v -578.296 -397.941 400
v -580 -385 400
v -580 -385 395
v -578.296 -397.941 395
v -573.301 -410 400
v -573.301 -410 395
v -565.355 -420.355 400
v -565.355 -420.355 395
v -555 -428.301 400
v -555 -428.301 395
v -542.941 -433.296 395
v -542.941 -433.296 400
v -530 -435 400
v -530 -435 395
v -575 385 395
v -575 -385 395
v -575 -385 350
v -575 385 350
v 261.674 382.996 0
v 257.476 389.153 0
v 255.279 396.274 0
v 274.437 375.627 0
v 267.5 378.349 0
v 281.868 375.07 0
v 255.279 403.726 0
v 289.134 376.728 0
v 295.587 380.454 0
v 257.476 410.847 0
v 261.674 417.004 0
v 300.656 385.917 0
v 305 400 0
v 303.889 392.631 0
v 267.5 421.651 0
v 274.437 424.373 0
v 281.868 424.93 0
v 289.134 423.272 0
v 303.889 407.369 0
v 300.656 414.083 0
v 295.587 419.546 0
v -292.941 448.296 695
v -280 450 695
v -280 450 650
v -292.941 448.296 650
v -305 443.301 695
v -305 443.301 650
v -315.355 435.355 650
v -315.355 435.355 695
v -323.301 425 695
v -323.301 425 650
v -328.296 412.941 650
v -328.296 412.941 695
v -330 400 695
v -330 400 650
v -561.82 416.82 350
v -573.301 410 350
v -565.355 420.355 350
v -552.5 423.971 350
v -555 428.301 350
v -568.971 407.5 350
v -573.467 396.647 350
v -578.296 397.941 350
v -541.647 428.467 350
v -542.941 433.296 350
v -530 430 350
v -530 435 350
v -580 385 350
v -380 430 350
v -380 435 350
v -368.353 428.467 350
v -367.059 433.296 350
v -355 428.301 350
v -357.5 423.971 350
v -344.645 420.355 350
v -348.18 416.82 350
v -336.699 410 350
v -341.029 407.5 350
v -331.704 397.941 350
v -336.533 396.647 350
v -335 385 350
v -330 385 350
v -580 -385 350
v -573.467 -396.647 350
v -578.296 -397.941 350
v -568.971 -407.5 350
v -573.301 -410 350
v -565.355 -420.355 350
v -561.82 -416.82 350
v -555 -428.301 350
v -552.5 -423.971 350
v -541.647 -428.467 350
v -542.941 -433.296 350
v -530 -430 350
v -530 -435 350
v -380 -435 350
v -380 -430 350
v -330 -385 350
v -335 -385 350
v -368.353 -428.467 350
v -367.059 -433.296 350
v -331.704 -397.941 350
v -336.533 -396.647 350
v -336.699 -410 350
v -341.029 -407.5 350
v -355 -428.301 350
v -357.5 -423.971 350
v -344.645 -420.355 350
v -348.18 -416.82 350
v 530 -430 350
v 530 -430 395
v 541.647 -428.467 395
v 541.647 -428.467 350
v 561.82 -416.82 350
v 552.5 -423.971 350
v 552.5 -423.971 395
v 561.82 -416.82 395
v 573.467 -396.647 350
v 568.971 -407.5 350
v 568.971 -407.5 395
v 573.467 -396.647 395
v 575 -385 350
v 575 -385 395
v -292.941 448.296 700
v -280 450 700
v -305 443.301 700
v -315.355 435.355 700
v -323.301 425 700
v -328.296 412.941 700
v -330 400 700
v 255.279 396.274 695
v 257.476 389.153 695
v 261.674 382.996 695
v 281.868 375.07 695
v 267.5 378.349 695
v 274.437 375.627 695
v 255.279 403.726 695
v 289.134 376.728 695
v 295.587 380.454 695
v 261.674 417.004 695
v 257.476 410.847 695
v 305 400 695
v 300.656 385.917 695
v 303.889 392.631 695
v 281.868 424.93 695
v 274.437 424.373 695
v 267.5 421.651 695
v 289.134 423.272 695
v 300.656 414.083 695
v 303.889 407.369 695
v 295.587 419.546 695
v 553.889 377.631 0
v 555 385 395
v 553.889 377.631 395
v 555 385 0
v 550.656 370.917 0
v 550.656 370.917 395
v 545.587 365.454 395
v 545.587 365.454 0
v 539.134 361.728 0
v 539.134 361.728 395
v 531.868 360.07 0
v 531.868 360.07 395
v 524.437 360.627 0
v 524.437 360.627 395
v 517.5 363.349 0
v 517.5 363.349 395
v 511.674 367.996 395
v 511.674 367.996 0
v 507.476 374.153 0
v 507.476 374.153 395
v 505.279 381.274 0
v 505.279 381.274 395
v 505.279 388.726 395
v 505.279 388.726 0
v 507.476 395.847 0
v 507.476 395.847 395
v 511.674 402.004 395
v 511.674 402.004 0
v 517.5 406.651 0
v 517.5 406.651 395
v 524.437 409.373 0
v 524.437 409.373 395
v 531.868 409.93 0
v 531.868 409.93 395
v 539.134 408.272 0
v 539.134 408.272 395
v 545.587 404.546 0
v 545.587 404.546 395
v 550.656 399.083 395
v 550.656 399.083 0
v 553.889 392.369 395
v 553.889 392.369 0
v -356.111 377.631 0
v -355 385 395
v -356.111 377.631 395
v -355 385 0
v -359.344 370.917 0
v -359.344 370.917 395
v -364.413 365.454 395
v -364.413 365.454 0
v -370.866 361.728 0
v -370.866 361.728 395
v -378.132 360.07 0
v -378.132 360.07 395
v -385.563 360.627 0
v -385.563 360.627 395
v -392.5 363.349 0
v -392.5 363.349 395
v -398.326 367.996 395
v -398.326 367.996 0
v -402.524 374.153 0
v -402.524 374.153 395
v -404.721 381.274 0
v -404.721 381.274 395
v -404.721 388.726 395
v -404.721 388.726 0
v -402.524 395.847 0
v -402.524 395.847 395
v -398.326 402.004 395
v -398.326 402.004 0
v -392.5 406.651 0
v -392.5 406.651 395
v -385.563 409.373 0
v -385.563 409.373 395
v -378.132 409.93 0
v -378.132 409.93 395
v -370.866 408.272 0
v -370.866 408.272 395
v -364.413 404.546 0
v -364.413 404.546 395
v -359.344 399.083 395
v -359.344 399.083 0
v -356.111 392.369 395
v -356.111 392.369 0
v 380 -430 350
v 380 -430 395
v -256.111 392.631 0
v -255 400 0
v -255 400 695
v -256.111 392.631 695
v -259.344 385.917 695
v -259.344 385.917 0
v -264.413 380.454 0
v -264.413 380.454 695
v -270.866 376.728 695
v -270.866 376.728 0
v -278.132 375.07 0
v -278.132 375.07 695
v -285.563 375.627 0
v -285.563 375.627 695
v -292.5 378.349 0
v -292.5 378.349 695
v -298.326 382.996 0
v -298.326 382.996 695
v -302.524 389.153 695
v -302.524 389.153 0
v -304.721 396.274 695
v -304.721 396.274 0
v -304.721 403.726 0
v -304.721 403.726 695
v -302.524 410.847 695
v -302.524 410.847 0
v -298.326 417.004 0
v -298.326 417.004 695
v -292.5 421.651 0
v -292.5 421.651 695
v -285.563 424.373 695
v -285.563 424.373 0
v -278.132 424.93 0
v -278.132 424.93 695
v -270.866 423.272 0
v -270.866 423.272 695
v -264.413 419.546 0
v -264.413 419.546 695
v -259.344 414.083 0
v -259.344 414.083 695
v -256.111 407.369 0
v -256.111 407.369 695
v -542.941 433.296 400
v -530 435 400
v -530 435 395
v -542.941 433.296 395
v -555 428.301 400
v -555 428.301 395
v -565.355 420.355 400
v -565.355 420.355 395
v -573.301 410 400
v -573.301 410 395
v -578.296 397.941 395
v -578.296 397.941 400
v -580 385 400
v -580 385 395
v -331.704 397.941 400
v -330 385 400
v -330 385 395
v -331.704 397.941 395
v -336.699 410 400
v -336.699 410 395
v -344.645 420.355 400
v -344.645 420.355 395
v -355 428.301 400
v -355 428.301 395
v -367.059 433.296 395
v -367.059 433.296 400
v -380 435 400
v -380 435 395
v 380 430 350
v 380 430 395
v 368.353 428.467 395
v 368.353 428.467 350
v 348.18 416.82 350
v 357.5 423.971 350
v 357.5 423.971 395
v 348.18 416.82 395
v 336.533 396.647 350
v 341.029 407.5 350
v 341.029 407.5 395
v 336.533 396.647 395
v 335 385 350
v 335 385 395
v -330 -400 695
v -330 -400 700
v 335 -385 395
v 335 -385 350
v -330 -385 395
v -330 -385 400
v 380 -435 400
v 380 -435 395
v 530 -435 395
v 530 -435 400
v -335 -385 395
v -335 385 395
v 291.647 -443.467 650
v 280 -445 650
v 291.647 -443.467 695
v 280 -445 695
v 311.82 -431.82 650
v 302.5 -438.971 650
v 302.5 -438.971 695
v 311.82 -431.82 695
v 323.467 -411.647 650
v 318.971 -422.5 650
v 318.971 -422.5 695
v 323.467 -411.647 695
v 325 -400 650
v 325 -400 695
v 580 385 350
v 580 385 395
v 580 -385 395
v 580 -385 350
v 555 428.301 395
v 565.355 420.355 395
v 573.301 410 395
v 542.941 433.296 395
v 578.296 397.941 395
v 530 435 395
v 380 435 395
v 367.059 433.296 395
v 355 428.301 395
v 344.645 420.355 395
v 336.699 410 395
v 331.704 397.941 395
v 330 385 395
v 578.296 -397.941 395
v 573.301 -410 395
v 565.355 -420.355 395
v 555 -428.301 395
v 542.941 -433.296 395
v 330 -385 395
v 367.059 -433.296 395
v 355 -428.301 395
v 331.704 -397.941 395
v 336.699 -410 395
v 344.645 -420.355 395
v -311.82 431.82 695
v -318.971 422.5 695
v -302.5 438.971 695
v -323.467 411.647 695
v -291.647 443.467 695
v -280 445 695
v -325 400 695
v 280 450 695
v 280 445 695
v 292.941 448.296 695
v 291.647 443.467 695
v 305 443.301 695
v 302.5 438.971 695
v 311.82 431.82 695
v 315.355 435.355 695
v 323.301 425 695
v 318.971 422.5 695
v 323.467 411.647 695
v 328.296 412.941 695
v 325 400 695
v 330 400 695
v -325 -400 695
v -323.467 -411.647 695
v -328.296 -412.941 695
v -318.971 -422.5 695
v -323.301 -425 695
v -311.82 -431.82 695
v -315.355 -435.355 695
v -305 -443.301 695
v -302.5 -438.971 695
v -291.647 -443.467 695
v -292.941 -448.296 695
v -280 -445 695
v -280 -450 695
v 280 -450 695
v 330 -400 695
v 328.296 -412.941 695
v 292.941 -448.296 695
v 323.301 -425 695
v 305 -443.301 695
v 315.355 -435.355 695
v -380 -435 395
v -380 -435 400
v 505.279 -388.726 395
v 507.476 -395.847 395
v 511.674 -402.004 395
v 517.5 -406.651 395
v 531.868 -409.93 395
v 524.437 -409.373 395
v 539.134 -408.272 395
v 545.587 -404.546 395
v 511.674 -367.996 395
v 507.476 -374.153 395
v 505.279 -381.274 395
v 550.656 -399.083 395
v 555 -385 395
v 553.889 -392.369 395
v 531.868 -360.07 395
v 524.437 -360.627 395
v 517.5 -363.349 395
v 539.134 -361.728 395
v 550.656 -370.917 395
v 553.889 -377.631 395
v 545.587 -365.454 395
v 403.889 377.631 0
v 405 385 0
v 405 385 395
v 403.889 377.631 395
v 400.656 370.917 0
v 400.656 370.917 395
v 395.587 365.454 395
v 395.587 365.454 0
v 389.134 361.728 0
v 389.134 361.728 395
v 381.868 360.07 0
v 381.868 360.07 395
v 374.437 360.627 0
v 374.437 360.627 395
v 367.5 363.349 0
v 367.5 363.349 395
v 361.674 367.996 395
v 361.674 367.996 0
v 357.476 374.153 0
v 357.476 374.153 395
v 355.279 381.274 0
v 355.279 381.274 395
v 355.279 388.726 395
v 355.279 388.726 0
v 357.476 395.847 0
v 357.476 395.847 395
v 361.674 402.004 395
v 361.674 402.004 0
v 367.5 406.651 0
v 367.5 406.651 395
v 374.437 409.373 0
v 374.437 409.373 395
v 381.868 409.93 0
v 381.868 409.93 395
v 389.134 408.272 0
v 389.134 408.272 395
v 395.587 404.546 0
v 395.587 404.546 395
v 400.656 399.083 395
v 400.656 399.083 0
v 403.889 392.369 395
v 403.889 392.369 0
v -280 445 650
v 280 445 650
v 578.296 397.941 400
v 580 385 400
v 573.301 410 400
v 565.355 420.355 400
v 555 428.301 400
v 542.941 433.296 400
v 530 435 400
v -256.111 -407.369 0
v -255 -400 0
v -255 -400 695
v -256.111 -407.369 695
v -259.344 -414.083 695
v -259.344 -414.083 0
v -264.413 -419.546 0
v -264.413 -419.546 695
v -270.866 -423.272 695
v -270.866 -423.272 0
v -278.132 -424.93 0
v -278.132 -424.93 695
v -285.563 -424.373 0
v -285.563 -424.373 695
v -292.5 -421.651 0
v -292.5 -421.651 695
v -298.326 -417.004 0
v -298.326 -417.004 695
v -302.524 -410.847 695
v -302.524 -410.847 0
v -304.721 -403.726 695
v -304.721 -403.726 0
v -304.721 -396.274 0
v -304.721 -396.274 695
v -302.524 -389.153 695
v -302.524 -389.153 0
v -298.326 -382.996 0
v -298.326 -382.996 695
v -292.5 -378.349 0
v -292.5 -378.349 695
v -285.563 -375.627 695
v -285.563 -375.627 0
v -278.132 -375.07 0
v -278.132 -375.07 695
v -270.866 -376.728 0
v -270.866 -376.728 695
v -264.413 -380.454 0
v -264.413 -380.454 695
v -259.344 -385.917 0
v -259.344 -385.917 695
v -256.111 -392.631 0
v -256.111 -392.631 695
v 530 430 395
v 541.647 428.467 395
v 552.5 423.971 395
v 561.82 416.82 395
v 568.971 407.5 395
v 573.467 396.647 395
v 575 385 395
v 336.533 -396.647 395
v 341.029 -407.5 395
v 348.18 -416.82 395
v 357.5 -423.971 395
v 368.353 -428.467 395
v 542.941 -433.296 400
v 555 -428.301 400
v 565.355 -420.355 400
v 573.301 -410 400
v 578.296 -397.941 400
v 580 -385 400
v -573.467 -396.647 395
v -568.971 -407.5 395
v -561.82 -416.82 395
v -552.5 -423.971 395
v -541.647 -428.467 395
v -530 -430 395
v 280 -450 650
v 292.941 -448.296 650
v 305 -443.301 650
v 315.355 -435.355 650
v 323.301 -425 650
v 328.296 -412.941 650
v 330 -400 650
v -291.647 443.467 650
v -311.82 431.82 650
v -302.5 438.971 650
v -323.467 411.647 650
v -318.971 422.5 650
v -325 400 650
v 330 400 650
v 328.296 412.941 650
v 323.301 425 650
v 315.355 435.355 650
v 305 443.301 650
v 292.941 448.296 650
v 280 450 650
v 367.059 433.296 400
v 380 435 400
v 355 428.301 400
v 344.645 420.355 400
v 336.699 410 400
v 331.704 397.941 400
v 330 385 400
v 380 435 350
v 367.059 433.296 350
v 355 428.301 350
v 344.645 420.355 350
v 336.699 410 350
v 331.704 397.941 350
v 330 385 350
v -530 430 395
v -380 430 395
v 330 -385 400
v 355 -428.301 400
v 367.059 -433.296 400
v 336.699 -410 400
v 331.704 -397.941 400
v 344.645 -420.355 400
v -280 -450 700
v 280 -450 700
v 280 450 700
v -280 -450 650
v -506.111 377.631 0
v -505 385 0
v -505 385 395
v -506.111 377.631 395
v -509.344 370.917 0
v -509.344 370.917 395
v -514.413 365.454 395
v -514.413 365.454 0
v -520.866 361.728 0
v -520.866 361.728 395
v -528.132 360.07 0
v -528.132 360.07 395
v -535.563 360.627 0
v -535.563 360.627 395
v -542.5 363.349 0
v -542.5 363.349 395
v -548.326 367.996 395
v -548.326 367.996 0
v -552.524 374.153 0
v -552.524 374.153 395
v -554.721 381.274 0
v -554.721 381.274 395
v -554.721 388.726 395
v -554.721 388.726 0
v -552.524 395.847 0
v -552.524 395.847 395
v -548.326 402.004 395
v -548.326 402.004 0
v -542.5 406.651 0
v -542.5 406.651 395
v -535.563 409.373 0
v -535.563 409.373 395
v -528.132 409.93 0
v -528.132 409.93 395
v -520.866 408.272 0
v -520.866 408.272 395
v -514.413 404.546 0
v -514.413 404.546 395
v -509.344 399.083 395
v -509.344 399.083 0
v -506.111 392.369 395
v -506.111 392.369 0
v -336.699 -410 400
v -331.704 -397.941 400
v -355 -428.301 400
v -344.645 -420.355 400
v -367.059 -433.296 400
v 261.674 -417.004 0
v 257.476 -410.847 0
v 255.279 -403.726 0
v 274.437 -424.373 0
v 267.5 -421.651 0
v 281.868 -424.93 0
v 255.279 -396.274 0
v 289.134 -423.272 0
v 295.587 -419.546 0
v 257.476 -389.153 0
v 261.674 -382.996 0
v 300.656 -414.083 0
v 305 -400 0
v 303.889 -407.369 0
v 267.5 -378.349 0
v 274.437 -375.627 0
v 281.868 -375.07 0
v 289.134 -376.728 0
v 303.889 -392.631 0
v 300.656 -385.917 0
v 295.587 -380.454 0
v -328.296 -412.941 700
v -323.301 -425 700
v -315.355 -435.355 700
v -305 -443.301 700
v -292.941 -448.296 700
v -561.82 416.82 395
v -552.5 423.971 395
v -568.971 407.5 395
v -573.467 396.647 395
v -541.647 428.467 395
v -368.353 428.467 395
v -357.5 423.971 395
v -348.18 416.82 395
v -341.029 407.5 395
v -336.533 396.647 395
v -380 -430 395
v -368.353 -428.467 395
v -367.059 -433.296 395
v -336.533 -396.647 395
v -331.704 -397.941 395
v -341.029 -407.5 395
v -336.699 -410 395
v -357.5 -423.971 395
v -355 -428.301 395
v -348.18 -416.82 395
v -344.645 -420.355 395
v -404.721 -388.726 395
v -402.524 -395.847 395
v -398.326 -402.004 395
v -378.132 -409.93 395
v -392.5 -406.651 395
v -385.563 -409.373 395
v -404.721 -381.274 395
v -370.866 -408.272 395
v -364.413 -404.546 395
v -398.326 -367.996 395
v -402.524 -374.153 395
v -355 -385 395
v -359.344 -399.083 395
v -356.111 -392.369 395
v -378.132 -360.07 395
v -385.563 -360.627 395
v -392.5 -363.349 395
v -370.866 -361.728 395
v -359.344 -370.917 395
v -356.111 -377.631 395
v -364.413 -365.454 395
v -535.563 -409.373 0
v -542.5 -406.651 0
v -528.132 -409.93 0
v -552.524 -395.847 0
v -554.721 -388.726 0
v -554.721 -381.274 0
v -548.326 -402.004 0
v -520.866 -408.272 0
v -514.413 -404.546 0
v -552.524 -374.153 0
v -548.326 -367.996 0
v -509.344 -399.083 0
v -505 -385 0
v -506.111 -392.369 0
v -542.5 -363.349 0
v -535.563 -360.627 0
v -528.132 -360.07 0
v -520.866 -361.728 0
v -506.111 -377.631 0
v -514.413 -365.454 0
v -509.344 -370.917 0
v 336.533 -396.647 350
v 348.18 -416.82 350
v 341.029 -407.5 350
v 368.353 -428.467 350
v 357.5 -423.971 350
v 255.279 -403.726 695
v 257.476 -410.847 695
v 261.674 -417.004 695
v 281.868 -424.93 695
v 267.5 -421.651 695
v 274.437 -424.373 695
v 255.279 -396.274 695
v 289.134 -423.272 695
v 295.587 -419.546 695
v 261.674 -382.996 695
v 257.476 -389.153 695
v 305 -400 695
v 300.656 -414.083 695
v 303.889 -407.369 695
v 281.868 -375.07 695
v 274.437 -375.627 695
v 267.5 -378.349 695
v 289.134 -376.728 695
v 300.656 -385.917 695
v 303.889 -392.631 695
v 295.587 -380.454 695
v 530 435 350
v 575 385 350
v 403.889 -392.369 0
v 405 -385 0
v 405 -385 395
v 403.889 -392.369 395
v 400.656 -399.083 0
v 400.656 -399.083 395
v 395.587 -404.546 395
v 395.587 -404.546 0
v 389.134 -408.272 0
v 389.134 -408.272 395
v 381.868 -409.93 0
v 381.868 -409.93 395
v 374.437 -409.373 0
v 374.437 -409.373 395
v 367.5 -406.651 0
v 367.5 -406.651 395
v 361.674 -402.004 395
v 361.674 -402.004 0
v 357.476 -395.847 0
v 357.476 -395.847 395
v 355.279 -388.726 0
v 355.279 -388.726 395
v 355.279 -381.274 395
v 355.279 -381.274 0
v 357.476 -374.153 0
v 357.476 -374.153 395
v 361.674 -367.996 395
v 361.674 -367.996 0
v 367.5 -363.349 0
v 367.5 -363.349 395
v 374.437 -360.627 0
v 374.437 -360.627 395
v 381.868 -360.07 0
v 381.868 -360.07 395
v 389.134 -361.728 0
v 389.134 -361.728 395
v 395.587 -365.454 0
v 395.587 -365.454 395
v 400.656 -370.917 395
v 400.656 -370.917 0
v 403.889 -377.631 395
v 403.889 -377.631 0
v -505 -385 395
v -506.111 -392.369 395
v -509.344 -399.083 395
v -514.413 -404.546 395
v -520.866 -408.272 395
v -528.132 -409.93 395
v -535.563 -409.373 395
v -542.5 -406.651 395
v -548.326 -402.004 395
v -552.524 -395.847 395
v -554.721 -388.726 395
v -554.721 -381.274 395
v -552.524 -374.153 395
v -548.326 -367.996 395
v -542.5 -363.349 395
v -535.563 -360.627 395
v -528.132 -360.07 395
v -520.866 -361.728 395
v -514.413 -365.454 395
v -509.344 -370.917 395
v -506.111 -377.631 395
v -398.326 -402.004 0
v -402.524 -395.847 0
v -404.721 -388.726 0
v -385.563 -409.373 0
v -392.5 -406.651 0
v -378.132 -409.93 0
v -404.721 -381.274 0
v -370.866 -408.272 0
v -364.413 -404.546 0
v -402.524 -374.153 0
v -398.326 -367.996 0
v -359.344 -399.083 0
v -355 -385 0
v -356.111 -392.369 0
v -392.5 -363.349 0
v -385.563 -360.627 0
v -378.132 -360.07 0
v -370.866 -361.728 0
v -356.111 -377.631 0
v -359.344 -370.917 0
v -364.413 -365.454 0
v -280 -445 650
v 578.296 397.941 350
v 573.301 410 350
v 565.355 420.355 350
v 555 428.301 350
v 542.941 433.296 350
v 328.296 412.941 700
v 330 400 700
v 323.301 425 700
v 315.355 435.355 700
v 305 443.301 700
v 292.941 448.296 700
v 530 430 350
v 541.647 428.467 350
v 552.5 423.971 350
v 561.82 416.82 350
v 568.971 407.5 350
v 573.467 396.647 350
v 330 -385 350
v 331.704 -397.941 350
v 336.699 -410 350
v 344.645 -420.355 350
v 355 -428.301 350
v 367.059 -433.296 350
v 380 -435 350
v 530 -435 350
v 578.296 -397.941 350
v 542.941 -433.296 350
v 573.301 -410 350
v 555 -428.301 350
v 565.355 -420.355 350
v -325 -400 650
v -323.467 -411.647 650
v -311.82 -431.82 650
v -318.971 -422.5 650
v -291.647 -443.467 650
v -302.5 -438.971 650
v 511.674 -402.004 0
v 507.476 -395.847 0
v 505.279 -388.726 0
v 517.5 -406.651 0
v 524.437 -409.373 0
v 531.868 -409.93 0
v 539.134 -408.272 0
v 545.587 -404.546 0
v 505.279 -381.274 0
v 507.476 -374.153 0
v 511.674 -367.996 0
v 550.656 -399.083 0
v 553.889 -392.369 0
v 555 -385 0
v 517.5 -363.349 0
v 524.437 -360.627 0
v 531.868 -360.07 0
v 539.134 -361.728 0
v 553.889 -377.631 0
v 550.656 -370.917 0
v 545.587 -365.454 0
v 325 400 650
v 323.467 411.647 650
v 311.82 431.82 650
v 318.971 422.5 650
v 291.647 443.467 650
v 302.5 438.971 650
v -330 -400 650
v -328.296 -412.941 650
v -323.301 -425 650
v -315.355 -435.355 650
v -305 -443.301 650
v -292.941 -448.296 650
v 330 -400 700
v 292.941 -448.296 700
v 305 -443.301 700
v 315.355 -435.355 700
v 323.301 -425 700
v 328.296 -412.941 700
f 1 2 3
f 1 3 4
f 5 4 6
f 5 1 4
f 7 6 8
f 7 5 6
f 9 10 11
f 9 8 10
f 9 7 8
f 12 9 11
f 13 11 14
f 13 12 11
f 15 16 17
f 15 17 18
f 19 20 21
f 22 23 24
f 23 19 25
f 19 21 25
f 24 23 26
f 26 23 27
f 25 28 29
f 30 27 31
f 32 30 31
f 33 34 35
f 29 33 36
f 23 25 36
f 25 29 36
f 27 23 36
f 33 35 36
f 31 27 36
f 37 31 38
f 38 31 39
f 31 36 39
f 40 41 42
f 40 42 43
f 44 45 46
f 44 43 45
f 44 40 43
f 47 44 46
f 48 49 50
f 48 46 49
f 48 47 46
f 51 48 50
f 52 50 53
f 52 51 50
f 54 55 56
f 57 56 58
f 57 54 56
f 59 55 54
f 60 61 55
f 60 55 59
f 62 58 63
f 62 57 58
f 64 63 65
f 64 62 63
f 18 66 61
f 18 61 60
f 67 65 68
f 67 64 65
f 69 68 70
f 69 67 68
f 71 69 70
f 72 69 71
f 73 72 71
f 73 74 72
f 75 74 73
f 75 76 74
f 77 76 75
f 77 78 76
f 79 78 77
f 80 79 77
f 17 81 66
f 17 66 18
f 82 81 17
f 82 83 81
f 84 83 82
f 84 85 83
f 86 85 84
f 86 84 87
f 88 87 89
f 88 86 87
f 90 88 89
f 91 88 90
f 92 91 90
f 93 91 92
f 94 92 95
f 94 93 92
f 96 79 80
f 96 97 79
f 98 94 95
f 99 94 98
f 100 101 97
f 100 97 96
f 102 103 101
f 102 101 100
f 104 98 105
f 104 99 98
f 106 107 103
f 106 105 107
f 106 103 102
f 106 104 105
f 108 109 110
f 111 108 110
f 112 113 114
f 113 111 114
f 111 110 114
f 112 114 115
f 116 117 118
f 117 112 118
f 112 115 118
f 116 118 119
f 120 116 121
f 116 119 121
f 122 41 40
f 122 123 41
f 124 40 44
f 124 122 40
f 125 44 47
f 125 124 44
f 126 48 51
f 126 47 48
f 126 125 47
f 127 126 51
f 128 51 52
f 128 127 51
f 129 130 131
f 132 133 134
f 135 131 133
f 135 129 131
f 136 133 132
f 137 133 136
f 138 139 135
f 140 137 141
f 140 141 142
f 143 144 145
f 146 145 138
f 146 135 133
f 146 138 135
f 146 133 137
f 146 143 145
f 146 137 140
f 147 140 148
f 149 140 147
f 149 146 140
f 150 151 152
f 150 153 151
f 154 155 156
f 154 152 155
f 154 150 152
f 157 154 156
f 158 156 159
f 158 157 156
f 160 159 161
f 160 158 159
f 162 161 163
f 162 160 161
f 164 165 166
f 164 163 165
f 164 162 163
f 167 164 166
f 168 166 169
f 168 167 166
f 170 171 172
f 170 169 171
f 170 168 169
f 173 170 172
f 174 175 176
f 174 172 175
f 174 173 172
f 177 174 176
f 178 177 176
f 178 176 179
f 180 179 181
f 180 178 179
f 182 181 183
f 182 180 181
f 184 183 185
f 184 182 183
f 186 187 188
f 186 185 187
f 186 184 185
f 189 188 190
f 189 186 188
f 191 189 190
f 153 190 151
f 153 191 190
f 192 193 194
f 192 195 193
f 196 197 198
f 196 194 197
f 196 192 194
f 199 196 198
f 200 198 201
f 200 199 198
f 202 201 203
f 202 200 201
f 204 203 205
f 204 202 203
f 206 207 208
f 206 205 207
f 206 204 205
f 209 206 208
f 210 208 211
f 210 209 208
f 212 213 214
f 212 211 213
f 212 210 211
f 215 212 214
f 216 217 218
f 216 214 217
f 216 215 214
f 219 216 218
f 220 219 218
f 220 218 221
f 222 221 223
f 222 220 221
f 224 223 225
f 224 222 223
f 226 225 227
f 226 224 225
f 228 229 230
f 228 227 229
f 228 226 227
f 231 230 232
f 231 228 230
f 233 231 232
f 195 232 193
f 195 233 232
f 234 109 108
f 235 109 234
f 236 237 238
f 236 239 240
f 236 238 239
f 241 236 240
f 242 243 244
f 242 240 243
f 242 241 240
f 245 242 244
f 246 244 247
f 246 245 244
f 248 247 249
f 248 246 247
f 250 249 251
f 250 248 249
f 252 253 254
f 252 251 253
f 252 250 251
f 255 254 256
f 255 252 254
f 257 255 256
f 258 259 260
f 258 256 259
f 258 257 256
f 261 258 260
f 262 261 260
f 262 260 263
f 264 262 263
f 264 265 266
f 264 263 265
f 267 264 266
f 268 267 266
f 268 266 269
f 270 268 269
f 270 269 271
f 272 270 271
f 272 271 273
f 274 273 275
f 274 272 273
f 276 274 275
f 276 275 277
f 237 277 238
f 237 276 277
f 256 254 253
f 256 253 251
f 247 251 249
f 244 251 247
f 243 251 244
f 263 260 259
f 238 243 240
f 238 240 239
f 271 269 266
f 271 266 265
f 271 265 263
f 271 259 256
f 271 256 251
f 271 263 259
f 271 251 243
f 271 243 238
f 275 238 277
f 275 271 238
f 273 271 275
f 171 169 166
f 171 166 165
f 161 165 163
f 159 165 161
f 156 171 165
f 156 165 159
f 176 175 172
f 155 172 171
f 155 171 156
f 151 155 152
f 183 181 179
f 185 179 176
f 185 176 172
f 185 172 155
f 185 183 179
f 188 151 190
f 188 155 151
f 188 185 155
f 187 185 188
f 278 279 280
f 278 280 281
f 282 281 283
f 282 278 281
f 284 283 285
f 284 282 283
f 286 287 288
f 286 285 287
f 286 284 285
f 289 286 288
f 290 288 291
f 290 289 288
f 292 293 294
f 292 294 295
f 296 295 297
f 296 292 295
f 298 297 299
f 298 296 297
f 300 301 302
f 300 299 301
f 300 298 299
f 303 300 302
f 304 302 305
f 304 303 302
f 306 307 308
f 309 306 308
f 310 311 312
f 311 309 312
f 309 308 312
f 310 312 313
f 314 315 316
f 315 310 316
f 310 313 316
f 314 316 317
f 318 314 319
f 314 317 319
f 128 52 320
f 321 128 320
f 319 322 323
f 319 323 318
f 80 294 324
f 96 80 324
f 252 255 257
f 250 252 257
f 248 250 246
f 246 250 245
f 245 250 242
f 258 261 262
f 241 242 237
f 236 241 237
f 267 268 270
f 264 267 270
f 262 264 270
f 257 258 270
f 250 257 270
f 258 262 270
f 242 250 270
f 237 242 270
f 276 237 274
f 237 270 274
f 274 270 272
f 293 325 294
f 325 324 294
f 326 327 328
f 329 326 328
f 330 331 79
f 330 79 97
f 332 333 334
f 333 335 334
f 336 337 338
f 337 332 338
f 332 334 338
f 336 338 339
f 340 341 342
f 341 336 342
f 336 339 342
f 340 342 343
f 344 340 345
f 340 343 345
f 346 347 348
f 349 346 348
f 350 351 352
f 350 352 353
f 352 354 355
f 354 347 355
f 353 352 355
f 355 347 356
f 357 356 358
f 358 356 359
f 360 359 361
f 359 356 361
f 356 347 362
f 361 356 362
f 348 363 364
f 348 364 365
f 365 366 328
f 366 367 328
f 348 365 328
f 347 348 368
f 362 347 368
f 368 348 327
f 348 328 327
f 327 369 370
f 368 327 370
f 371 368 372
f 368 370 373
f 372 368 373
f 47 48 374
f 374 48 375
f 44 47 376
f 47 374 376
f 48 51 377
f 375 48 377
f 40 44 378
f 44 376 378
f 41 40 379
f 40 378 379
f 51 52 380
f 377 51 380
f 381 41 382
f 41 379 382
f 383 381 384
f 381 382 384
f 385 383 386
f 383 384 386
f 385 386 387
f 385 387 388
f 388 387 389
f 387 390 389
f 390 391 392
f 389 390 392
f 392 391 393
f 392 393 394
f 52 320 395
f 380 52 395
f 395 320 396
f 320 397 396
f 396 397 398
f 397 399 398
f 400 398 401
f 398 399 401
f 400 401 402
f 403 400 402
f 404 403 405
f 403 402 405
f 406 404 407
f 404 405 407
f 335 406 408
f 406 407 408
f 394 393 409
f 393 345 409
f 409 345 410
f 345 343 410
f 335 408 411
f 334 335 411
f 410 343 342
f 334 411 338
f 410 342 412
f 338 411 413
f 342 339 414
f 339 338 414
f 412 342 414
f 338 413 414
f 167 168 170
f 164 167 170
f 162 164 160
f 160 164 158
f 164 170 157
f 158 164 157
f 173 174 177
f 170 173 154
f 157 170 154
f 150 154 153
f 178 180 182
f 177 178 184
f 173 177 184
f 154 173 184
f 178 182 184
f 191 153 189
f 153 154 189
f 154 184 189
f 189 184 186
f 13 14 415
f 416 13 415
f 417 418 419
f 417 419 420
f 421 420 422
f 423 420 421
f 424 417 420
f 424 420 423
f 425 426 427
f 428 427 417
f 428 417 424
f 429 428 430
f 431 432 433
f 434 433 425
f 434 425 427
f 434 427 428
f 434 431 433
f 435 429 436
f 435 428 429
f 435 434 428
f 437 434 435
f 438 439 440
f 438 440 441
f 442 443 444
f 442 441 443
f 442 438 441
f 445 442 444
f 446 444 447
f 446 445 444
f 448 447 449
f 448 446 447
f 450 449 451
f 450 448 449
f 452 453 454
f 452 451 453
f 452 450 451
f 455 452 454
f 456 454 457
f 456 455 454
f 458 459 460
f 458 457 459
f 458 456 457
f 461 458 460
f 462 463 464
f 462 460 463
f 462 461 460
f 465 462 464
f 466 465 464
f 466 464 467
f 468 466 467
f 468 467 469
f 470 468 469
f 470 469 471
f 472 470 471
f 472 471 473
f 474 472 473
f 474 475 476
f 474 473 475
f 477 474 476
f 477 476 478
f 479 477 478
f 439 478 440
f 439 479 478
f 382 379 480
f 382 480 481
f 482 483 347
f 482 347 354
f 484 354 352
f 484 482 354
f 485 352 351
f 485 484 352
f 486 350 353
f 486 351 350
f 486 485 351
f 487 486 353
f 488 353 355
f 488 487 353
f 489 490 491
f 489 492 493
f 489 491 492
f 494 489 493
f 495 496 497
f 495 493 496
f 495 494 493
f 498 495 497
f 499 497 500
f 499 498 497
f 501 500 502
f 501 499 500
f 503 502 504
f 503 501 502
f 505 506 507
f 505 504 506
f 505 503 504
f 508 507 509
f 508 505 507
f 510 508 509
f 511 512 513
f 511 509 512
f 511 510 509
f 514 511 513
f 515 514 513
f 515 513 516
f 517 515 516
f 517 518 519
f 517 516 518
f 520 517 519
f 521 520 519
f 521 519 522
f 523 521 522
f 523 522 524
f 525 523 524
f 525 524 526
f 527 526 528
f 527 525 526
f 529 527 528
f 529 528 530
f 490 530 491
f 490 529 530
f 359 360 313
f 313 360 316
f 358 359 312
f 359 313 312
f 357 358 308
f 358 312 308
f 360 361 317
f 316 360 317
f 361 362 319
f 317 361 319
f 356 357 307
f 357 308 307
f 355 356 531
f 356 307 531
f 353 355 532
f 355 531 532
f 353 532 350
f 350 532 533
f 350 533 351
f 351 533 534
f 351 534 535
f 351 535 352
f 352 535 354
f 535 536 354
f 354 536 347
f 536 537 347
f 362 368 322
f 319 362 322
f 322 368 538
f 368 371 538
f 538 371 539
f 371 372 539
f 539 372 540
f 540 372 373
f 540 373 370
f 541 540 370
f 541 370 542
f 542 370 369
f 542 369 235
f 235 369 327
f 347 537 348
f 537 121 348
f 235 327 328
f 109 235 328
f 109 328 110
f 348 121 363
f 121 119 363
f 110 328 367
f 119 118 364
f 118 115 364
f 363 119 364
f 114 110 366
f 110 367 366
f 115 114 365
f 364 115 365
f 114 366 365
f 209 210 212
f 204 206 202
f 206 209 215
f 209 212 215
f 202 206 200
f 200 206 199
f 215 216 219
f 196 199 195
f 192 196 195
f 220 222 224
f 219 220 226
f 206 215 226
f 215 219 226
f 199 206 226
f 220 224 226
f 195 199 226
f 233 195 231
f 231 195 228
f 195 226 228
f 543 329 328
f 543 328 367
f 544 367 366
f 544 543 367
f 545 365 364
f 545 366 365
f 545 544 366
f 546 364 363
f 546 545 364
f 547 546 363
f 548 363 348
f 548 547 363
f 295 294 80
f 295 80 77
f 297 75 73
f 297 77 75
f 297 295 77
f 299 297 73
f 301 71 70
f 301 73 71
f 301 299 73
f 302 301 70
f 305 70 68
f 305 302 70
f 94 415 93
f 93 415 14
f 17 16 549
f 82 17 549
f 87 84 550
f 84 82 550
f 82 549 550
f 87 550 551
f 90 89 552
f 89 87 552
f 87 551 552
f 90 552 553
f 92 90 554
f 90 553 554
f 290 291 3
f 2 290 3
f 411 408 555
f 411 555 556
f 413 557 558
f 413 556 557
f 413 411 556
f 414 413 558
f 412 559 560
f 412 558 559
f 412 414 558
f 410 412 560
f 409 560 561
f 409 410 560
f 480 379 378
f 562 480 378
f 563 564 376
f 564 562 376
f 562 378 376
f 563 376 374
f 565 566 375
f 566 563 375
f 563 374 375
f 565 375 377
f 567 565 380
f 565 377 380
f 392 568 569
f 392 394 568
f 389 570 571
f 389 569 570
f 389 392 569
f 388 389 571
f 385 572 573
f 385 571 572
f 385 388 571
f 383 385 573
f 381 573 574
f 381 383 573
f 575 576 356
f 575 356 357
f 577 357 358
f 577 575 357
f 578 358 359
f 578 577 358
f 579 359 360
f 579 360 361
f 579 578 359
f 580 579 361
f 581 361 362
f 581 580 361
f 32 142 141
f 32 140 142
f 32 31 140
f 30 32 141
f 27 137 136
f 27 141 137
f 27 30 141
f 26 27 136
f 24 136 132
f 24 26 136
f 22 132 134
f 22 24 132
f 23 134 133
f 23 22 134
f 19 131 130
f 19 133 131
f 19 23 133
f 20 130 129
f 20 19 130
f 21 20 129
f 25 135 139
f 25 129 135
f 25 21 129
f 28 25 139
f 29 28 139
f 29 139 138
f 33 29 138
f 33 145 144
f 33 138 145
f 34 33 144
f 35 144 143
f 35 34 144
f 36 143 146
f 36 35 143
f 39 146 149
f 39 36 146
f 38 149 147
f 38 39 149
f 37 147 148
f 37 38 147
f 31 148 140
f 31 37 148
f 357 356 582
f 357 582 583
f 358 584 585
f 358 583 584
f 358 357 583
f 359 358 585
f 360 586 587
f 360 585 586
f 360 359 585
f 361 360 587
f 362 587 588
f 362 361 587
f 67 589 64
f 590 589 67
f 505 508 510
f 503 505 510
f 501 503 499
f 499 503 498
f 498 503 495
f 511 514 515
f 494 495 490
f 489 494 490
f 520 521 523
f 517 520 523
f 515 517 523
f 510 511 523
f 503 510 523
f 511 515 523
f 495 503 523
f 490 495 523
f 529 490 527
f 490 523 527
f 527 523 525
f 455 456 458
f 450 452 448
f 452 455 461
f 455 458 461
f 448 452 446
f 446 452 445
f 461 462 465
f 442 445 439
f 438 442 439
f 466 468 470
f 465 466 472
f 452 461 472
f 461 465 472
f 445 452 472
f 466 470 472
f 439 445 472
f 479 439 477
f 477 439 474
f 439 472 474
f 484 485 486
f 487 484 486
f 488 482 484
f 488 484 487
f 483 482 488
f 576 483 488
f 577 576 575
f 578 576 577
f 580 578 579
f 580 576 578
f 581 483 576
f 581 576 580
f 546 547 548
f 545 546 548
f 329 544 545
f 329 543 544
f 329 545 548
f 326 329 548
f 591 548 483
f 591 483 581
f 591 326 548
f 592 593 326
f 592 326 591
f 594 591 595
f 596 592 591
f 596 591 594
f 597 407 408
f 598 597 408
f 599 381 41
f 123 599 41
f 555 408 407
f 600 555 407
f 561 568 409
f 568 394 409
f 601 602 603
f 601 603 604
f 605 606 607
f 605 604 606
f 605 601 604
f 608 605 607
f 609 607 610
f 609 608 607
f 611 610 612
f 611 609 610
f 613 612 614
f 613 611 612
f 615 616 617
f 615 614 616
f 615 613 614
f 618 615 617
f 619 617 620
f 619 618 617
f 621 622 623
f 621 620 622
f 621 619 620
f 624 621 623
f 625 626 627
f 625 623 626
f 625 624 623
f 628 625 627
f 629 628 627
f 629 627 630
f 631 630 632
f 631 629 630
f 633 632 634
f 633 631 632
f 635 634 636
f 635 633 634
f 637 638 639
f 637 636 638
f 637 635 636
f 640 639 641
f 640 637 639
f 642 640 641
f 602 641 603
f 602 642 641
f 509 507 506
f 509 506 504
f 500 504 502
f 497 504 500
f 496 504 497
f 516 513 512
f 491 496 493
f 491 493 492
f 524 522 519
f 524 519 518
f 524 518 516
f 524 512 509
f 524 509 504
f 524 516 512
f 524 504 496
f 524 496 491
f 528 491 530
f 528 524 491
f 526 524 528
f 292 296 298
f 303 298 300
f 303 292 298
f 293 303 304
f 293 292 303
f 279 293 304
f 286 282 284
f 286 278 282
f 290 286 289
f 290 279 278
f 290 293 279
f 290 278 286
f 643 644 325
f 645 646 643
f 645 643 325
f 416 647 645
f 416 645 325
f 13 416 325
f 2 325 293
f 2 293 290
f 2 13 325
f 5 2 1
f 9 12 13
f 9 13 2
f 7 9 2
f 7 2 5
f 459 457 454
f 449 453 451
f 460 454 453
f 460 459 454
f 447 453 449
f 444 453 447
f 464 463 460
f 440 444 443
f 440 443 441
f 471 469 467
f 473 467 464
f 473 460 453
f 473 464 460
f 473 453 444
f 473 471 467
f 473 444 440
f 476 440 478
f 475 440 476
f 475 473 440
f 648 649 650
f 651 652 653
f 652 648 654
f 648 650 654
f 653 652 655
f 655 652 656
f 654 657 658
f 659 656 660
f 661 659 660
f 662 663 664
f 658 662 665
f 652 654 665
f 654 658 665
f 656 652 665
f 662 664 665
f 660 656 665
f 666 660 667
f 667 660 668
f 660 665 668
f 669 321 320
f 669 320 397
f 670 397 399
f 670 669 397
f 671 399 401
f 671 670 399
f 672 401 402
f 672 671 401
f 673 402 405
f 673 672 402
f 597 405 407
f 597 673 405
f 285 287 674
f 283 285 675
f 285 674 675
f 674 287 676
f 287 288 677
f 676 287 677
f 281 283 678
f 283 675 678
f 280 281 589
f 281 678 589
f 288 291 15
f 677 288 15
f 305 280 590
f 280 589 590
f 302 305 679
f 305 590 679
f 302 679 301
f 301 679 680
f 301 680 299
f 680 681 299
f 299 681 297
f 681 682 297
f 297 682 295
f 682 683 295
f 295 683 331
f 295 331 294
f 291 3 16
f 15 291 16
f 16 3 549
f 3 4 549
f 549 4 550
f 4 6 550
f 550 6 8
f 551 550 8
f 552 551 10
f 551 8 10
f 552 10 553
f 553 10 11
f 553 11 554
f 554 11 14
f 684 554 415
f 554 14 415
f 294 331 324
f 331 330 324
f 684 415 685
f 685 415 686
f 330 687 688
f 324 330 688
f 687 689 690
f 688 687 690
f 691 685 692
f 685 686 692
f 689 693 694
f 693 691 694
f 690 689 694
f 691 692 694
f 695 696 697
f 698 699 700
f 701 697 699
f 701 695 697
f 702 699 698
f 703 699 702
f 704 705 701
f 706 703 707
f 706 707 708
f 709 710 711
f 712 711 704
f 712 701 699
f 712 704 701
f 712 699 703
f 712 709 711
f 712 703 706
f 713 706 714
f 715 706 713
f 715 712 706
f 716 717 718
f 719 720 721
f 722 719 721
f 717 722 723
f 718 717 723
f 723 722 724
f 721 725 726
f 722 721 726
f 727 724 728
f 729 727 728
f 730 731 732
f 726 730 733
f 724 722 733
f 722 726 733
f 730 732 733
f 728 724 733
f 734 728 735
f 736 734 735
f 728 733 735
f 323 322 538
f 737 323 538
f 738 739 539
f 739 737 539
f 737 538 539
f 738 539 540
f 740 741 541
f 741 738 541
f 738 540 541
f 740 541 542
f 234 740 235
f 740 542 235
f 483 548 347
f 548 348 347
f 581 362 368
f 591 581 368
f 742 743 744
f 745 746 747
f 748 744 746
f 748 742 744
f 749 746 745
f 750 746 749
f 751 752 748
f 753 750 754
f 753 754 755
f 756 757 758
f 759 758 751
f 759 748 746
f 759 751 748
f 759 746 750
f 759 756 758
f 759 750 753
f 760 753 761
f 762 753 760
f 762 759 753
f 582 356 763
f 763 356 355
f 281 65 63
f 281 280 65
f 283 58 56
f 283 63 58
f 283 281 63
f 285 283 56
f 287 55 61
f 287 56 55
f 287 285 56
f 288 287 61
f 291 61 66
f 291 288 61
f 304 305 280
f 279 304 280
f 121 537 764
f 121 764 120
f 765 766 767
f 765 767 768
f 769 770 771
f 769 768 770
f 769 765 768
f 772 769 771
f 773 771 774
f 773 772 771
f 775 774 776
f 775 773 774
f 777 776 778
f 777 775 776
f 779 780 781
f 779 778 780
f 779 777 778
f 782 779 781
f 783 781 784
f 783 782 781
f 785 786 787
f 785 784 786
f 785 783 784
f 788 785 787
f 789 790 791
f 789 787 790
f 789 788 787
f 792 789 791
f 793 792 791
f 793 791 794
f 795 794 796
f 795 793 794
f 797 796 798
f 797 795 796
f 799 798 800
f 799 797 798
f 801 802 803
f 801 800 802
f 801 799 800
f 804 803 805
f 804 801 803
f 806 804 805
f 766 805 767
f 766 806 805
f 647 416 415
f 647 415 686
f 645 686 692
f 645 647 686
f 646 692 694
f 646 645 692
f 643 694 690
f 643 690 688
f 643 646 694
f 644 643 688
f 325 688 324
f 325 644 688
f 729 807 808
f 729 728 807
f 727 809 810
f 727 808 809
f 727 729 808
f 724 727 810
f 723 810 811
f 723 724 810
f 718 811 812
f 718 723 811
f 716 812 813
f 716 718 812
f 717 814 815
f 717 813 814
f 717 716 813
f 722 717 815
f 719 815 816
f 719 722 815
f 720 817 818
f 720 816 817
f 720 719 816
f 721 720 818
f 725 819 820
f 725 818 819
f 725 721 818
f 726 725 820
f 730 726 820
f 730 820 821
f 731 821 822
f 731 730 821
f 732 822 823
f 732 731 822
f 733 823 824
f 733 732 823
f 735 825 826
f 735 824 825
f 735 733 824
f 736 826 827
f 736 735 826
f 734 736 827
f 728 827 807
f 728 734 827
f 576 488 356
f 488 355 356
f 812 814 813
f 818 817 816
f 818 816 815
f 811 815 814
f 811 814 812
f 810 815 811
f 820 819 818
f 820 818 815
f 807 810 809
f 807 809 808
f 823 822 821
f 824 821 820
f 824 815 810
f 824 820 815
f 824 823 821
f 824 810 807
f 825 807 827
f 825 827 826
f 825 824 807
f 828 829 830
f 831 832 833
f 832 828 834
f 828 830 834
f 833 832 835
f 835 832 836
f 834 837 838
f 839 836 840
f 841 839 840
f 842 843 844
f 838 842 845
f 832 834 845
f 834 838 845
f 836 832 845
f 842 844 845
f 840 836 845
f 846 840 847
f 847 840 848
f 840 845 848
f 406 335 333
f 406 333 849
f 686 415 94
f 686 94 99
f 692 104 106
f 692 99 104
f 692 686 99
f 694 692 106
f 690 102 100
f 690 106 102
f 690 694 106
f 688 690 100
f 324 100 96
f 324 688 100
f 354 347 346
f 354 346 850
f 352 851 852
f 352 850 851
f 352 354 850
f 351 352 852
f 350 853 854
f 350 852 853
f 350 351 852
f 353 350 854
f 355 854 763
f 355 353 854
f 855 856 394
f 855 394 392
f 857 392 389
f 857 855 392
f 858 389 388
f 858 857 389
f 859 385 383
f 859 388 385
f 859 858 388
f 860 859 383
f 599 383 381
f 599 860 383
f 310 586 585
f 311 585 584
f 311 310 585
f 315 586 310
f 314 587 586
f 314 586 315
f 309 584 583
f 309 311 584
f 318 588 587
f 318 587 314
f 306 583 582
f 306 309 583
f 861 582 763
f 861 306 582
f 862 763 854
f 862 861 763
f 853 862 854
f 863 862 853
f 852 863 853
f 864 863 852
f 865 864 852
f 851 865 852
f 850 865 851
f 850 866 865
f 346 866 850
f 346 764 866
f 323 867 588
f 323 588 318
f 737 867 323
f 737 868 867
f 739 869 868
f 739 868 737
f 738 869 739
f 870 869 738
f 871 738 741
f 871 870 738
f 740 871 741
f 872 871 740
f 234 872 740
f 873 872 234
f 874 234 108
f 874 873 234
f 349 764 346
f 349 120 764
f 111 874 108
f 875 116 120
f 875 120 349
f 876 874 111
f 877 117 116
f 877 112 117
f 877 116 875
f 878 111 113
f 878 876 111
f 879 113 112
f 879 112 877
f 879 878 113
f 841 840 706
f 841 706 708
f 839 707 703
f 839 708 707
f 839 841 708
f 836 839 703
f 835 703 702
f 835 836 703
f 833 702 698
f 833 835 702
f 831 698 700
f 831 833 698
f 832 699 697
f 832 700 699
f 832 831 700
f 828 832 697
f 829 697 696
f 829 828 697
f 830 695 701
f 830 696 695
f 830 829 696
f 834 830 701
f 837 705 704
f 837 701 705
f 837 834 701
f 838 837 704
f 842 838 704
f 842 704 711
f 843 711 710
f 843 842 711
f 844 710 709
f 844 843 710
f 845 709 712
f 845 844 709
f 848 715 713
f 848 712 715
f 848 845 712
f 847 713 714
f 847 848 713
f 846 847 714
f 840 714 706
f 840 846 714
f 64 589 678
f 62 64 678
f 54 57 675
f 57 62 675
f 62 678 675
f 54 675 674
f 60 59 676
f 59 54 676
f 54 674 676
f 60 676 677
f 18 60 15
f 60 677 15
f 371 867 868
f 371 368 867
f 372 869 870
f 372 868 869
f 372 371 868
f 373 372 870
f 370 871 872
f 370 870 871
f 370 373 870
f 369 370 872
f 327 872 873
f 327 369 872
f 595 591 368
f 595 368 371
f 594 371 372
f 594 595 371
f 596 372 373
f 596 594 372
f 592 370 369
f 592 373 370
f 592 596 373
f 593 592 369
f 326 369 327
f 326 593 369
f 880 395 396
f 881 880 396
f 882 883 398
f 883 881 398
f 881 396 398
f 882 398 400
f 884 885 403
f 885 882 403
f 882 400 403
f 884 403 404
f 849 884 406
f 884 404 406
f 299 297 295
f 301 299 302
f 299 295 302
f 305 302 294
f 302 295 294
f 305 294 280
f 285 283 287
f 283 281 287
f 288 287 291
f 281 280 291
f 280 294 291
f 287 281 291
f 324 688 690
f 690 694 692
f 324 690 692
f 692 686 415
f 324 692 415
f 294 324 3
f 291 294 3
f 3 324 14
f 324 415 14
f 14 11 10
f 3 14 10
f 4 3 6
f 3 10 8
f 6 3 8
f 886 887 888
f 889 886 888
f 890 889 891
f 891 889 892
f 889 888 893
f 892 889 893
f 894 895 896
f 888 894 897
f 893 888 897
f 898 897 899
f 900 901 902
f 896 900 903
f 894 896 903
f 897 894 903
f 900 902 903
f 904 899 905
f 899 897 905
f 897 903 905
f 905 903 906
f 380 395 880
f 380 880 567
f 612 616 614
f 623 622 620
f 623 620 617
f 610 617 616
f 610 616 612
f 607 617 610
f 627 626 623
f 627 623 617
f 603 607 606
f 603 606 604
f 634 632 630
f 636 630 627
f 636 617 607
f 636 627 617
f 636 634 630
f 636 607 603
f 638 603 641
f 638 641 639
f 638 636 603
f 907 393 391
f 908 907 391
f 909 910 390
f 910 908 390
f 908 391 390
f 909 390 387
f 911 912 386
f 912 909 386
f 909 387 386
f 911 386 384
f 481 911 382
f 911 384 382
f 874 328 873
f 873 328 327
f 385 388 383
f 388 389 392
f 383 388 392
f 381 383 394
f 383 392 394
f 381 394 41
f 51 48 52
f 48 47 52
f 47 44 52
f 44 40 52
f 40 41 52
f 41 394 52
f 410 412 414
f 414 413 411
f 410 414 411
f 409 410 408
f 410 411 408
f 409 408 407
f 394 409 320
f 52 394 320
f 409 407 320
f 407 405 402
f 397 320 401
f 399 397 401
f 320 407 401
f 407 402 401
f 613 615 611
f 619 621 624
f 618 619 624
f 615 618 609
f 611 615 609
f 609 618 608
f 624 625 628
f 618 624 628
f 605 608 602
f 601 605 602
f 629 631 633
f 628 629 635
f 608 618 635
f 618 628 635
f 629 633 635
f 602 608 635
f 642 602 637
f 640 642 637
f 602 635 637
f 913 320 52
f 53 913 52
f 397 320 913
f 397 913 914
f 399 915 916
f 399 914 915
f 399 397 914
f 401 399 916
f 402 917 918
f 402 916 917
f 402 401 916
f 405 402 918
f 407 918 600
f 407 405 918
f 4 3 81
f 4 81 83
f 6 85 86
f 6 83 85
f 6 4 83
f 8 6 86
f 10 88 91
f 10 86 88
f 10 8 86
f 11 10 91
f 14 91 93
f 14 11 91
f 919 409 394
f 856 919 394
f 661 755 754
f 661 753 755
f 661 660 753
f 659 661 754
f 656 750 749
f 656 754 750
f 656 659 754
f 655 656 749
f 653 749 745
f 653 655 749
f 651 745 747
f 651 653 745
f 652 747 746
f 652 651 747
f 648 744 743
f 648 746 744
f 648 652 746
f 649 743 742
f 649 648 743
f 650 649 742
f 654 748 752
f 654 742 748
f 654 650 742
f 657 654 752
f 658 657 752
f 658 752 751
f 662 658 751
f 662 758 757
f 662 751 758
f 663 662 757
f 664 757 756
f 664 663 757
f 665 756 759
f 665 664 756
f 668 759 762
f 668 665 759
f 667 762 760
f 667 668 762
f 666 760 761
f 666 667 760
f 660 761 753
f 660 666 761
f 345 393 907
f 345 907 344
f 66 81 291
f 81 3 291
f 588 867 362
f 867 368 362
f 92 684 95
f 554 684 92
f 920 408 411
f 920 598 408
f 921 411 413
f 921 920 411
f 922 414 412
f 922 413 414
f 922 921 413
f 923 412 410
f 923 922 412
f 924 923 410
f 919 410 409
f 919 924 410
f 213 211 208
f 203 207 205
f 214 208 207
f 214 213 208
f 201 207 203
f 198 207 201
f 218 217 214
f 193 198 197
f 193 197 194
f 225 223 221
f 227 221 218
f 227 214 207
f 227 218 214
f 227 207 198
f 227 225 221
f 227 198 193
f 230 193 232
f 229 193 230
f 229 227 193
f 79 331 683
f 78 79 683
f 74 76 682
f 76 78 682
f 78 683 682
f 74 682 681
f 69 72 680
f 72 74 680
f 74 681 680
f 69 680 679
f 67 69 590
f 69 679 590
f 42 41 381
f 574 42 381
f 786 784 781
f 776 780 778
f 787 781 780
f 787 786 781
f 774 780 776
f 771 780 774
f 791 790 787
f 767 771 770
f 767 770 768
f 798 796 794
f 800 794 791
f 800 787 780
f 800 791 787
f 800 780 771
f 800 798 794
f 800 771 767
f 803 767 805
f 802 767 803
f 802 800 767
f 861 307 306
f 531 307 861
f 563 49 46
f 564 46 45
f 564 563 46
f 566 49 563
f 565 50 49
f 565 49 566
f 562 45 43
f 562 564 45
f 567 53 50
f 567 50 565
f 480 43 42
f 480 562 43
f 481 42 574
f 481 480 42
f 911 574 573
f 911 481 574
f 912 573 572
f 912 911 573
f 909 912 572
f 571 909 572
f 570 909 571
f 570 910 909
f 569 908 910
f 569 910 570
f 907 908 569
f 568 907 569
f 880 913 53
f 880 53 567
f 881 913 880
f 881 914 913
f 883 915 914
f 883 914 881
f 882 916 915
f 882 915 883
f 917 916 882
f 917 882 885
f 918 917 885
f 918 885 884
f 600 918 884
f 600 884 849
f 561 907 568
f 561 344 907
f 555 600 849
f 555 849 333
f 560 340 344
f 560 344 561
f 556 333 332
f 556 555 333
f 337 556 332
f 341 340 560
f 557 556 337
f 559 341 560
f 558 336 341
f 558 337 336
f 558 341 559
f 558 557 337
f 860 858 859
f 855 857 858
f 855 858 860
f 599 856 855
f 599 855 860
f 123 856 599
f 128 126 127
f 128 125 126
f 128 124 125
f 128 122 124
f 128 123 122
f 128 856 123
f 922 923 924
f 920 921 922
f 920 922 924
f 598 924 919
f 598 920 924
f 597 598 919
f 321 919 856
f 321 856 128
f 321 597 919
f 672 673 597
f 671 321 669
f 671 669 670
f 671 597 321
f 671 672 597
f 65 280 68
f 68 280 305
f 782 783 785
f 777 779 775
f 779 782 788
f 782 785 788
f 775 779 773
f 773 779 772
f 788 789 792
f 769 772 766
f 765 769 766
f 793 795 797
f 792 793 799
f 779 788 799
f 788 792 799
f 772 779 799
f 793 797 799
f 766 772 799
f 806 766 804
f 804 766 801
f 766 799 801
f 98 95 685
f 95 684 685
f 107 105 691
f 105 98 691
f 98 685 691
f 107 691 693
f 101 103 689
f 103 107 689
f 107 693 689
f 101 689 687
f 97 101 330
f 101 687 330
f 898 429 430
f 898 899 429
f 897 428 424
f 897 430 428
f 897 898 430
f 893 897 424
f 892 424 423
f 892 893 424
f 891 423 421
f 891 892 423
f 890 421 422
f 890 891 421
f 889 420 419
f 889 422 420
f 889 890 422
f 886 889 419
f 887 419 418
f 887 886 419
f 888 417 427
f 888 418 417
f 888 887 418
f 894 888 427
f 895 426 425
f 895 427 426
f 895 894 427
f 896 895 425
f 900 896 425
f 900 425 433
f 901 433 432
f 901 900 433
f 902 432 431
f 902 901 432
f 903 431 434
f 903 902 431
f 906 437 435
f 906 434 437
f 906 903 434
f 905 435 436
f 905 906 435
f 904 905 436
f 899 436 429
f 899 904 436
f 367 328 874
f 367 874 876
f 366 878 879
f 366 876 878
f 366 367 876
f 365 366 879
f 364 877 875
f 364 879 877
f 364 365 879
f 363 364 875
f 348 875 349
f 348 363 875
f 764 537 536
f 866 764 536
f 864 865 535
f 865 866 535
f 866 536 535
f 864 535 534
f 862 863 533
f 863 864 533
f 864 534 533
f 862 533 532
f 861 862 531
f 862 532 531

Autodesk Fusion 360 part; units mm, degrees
sketch "Sketch1" plane through (0, 0, 0) normal (0, 0, 1) x (1, 0, 0)
  line L0 (-330, -450) -> (330, -450)
  line L1 (330, -450) -> (330, 450)
  line L2 (330, 450) -> (-330, 450)
  line L3 (-330, 450) -> (-330, -450)
  line L4 (-330, -450) -> (330, 450) construction
  line L5 (330, -450) -> (-330, 450) construction
  circle A0 centre (-280, -400) radius 25
  circle A1 centre (-280, -400) radius 25
  circle A2 centre (280, -400) radius 25
  circle A3 centre (280, 400) radius 25
  circle A4 centre (-280, 400) radius 25
  line L6 (-580, -435) -> (-330, -435)
  line L7 (-330, -435) -> (-330, 435)
  line L8 (-330, 435) -> (-580, 435)
  line L9 (-580, 435) -> (-580, -435)
  line L10 (330, -435) -> (580, -435)
  line L11 (580, -435) -> (580, 435)
  line L12 (580, 435) -> (330, 435)
  line L13 (330, 435) -> (330, -435)
  circle A5 centre (-530, -385) radius 25
  circle A6 centre (-380, -385) radius 25
  circle A7 centre (-530, 385) radius 25
  circle A8 centre (-380, 385) radius 25
  circle A9 centre (380, -385) radius 25
  circle A10 centre (530, -385) radius 25
  circle A11 centre (530, 385) radius 25
  circle A12 centre (380, 385) radius 25
  dimension "d1" = 900
  dimension "d2" = 660
  dimension "d3" = 50
  dimension "d4" = 50
  dimension "d5" = 50
  dimension "d6" = 50
  dimension "d7" = 50
  dimension "d8" = 50
  dimension "d9" = 50
  dimension "d10" = 50
  dimension "d11" = 50
  dimension "d12" = 50
  dimension "d13" = 250
  dimension "d14" = 870
  dimension "d15" = 15
  dimension "d16" = 50
  dimension "d17" = 50
  dimension "d18" = 50
  dimension "d19" = 50
  dimension "d20" = 50
  dimension "d21" = 50
  dimension "d22" = 50
  dimension "d23" = 50
  dimension "d24" = 50
  dimension "d25" = 50
  dimension "d26" = 50
  dimension "d27" = 50
  dimension "d28" = 50
  dimension "d29" = 50
  dimension "d30" = 50
  dimension "d31" = 50
extrude "Extrude1" add sketch "Sketch1" along normal blind 395 contours A5 | A6 | A7 | A8 | A9 | A10 | A11 | A12 makes body 1 at (-525.6588, -360.3798, 263.3333) makes body 2 at (404.9689, -386.2461, 263.3333) makes body 3 at (534.3412, 409.6202, 263.3333) makes body 4 at (-525.6588, 409.6202, 263.3333) makes body 5 at (-355.0311, -386.2461, 263.3333) makes body 6 at (534.3412, -360.3798, 263.3333) makes body 7 at (404.9689, 383.7539, 263.3333) makes body 8 at (-355.0311, 383.7539, 263.3333)
extrude "Extrude2" add sketch "Sketch1" along normal blind 695 separate body contours A0 A1 | A2 | A3 | A4 makes body 9 at (304.8758, 397.5108, 231.6667) makes body 10 at (304.8758, -402.4892, 231.6667) makes body 11 at (-255.1242, 397.5108, 231.6667) makes body 12 at (-255.1242, -402.4892, 231.6667)
sketch "Sketch2" plane through (0, 0, 395) normal (0, 0, 1) x (-1, 0, 0)
  circle A0 centre (530, -385) radius 25
  line L0 (-330, -435) -> (-330, 435)
  line L1 (-580, -435) -> (-330, -435)
  line L2 (-580, 435) -> (-580, -435)
  line L3 (-330, 435) -> (-580, 435)
  line L4 (330, 435) -> (330, -435)
  line L5 (330, -435) -> (580, -435)
  line L6 (580, -435) -> (580, 435)
  line L7 (580, 435) -> (330, 435)
extrude "Extrude3" add sketch "Sketch2" along normal blind 5 separate body contours A0 | L0 L1 L2 L3 | L4 L5 L6 L7 makes body 13 at (413.3333, 145, 395) makes body 14 at (-413.3333, -145, 395)
sketch "Sketch3" plane through (0, 0, 695) normal (0, 0, 1) x (-1, 0, 0)
  circle A0 centre (-280, -400) radius 25
  line L0 (330, 450) -> (-330, 450)
  line L1 (-330, -450) -> (330, -450)
  line L2 (330, -450) -> (330, 450)
  line L3 (-330, 450) -> (-330, -450)
extrude "Extrude4" add sketch "Sketch3" along normal blind 5 separate body contours A0 | L0 L1 L2 L3 makes body 15
fillet "Fillet2" radius 50 4 edges at (330, -450, 697.5) (-330, -450, 697.5) (-330, 450, 697.5) (330, 450, 697.5) on bodies 15
fillet "Fillet3" radius 50 4 edges at (580, 435, 397.5) (330, 435, 397.5) (580, -435, 397.5) (330, -435, 397.5) on bodies 13
fillet "Fillet4" radius 50 4 edges at (-580, -435, 397.5) (-330, -435, 397.5) (-580, 435, 397.5) (-330, 435, 397.5) on bodies 14
sketch "Sketch7" plane through (0, 0, 695) normal (0, 0, -1) x (1, 0, 0)
  arc A0 (280, -450) -> (330, -400) centre (280, -400) ccw
  line L0 (330, -400) -> (330, 400)
  arc A1 (330, 400) -> (280, 450) centre (280, 400) ccw
  line L1 (280, 450) -> (-280, 450)
  arc A2 (-280, 450) -> (-330, 400) centre (-280, 400) ccw
  line L2 (-330, 400) -> (-330, -400)
  arc A3 (-330, -400) -> (-280, -450) centre (-280, -400) ccw
  line L3 (-280, -450) -> (280, -450)
  arc A4 (280, -445) -> (325, -400) centre (280, -400) ccw
  line L4 (325, -400) -> (325, 400)
  arc A5 (325, 400) -> (280, 445) centre (280, 400) ccw
  line L5 (280, 445) -> (-280, 445)
  arc A6 (-280, 445) -> (-325, 400) centre (-280, 400) ccw
  line L6 (-325, 400) -> (-325, -400)
  arc A7 (-325, -400) -> (-280, -445) centre (-280, -400) ccw
  line L7 (-280, -445) -> (280, -445)
  dimension "d51" = -5
sketch "Sketch8" plane through (0, 0, 395) normal (0, 0, -1) x (1, 0, 0)
  arc A0 (-380, -435) -> (-330, -385) centre (-380, -385) ccw
  line L0 (-330, -385) -> (-330, 385)
  arc A1 (-330, 385) -> (-380, 435) centre (-380, 385) ccw
  line L1 (-380, 435) -> (-530, 435)
  arc A2 (-530, 435) -> (-580, 385) centre (-530, 385) ccw
  line L2 (-580, 385) -> (-580, -385)
  arc A3 (-580, -385) -> (-530, -435) centre (-530, -385) ccw
  line L3 (-530, -435) -> (-380, -435)
  line L4 (-335, -385) -> (-335, 385)
  arc A4 (-335, 385) -> (-380, 430) centre (-380, 385) ccw
  line L5 (-380, 430) -> (-530, 430)
  arc A5 (-530, 430) -> (-575, 385) centre (-530, 385) ccw
  line L6 (-575, 385) -> (-575, -385)
  arc A6 (-575, -385) -> (-530, -430) centre (-530, -385) ccw
  line L7 (-530, -430) -> (-380, -430)
  arc A7 (-380, -430) -> (-335, -385) centre (-380, -385) ccw
  dimension "d52" = -5
sketch "Sketch9" plane through (0, 0, 395) normal (0, 0, -1) x (1, 0, 0)
  arc A0 (380, 435) -> (330, 385) centre (380, 385) ccw
  line L0 (330, 385) -> (330, -385)
  arc A1 (330, -385) -> (380, -435) centre (380, -385) ccw
  line L1 (380, -435) -> (530, -435)
  arc A2 (530, -435) -> (580, -385) centre (530, -385) ccw
  line L2 (580, -385) -> (580, 385)
  arc A3 (580, 385) -> (530, 435) centre (530, 385) ccw
  line L3 (530, 435) -> (380, 435)
  line L4 (575, -385) -> (575, 385)
  arc A4 (575, 385) -> (530, 430) centre (530, 385) ccw
  line L5 (530, 430) -> (380, 430)
  arc A5 (380, 430) -> (335, 385) centre (380, 385) ccw
  line L6 (335, 385) -> (335, -385)
  arc A6 (335, -385) -> (380, -430) centre (380, -385) ccw
  line L7 (380, -430) -> (530, -430)
  arc A7 (530, -430) -> (575, -385) centre (530, -385) ccw
  dimension "d53" = -5
extrude "Extrude7" add sketch "Sketch7" along normal blind 45 separate body makes body 16
extrude "Extrude8" add sketch "Sketch9" along normal blind 45 separate body makes body 17
extrude "Extrude9" add sketch "Sketch8" along normal blind 45 separate body makes body 18
